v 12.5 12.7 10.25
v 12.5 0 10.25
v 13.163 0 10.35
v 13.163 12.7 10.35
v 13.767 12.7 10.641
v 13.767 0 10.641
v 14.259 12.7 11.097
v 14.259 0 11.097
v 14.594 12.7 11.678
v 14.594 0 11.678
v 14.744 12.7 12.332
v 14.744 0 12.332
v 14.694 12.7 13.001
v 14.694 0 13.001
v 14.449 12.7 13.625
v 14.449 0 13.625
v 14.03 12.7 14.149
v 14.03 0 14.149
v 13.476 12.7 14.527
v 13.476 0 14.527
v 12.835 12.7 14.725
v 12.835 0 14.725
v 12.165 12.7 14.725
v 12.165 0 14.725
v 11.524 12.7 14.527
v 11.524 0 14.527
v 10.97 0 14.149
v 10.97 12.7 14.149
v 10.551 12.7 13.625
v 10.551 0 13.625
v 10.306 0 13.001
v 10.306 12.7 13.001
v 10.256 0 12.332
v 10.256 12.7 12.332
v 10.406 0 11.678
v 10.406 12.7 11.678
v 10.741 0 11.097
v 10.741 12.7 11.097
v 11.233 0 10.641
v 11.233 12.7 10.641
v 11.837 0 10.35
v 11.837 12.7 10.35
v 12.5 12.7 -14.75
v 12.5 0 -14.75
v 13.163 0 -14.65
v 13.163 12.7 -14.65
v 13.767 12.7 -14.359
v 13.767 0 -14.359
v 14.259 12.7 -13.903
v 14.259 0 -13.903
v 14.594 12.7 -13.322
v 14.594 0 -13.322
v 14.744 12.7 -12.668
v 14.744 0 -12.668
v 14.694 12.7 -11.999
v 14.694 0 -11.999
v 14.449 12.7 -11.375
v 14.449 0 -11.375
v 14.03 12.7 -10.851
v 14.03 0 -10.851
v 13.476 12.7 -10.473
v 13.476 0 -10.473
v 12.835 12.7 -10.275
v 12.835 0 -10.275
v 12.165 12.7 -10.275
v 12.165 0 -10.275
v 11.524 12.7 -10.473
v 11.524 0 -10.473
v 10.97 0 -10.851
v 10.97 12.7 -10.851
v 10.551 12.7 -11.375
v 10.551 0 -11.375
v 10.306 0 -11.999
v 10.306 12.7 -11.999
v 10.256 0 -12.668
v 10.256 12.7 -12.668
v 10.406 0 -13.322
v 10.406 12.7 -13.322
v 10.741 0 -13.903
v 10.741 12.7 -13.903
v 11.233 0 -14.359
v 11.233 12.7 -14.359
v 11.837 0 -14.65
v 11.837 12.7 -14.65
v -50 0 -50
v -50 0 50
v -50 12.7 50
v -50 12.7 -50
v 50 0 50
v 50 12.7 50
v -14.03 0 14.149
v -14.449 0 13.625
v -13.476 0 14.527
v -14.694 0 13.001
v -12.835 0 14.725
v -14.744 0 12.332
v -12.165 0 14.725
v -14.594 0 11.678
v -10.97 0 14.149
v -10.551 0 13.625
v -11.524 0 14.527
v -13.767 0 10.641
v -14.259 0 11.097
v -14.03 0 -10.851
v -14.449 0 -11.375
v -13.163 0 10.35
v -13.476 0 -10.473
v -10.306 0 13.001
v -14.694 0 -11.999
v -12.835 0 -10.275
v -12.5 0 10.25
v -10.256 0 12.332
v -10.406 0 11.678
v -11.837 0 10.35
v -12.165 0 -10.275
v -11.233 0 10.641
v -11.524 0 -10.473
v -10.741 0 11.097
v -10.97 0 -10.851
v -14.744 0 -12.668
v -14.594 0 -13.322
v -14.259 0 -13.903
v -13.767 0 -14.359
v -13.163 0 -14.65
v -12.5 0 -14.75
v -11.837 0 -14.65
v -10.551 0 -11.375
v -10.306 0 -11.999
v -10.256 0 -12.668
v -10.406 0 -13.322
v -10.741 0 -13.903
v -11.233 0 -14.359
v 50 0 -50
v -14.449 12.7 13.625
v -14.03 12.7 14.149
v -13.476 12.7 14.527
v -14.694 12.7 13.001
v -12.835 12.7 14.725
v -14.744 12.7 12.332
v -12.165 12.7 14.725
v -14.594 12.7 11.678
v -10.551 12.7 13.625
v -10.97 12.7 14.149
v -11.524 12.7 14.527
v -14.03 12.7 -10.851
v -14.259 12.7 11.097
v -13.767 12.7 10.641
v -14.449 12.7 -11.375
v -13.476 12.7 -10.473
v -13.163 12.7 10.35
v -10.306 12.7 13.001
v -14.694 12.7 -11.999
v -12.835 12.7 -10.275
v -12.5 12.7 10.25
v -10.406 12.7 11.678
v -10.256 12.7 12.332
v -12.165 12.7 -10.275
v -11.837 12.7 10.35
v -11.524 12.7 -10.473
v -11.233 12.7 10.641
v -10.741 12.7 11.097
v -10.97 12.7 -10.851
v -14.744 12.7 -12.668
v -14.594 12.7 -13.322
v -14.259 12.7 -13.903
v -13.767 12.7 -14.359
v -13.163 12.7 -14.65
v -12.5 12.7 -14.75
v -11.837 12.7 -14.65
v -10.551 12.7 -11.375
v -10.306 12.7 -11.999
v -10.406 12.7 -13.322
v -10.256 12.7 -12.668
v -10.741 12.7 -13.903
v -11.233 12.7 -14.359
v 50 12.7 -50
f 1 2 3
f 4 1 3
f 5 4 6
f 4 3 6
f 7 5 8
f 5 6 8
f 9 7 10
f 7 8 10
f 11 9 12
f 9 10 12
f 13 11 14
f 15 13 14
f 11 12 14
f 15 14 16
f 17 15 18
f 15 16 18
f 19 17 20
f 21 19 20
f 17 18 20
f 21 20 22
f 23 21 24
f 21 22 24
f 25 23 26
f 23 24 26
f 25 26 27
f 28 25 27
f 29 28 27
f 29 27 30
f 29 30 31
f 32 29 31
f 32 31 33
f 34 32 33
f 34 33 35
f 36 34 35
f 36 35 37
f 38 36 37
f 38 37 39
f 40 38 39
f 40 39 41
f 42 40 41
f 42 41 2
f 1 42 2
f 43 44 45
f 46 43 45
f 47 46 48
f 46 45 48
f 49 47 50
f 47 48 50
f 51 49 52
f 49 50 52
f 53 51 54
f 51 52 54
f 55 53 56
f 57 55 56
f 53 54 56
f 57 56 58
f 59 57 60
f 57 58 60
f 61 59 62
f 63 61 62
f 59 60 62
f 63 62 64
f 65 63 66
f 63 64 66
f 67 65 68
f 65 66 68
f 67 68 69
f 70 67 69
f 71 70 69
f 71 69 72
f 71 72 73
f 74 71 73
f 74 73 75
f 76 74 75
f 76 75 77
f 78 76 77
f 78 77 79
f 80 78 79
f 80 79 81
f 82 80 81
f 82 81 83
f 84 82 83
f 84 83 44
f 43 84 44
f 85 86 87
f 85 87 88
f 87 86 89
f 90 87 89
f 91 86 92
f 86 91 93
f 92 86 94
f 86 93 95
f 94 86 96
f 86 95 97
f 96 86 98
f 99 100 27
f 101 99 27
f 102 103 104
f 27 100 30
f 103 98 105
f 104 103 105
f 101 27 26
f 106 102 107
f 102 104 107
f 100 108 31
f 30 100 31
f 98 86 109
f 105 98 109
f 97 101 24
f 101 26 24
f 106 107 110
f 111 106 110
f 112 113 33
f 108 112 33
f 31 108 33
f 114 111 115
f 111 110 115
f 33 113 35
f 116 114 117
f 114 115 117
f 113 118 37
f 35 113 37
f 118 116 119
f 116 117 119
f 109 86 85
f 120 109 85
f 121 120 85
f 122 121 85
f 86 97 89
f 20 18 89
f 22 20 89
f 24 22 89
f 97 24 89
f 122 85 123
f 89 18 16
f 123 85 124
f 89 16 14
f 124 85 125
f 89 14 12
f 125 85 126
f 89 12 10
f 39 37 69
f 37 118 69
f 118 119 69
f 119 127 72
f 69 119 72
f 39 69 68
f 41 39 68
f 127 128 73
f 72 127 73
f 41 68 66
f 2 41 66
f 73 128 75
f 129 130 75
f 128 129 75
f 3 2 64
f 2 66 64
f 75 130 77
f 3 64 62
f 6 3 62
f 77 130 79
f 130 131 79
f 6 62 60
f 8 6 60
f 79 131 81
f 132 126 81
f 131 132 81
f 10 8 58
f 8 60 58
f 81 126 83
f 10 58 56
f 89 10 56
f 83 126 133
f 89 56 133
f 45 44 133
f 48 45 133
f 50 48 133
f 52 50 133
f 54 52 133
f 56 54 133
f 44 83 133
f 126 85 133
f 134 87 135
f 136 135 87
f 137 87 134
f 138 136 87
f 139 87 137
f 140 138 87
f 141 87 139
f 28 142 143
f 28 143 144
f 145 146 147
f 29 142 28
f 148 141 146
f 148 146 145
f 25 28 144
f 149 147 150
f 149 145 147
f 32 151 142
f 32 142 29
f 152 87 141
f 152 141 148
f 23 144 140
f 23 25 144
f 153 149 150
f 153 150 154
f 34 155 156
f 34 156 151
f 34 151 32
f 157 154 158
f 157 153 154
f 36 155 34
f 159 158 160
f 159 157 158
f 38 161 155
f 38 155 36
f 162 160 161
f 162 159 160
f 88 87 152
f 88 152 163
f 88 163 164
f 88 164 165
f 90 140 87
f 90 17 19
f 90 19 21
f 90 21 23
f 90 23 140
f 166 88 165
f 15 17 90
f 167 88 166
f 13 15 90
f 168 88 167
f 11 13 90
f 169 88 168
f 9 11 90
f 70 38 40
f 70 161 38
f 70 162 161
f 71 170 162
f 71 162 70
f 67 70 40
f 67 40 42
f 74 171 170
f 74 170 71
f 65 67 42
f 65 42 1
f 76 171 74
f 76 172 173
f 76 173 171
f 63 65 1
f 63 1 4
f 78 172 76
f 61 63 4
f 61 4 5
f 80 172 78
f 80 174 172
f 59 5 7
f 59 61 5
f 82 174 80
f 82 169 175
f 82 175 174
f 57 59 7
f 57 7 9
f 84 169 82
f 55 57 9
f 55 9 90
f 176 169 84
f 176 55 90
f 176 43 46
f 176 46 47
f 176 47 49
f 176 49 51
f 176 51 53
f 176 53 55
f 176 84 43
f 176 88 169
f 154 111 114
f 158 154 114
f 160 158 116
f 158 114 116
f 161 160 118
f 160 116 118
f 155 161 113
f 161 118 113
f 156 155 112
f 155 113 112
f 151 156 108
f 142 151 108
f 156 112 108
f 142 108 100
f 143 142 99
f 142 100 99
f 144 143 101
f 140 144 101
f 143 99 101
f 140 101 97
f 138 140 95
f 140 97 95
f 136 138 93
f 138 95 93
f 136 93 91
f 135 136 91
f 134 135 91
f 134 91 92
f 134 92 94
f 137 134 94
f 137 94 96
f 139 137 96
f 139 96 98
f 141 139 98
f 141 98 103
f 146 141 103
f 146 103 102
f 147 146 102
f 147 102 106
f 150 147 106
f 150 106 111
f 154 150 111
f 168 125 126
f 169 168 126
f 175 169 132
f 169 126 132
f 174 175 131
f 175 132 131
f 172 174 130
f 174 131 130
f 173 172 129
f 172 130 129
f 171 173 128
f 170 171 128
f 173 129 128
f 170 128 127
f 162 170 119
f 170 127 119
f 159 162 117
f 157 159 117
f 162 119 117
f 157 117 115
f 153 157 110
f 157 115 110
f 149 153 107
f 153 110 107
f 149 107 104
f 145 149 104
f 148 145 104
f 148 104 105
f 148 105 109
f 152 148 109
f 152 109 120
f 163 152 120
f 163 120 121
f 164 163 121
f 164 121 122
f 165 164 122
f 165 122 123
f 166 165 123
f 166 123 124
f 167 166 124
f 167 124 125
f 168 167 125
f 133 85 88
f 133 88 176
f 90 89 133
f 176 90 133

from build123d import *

# Parameters (mm, degrees)
CROQUIS1_W              = 100
CROQUIS1_H              = 100
SALIENTE_EXTRUIR1_DEPTH = 12.7
CROQUIS3_OUTSIDE_W      = 130.398
CROQUIS3_OUTSIDE_H      = 130.398
CROQUIS3_OUTSIDE_W_2    = 100
CROQUIS3_OUTSIDE_H_2    = 100
CROQUIS3_OUTSIDE_R      = 2.25
CORTAR_EXTRUIR1_DEPTH   = 72.842118566


with BuildPart() as part:
    # Croquis1 → Saliente-Extruir1 (new body)
    with BuildSketch(Plane(origin=(0, 0, 0), x_dir=(1, 0, 0), z_dir=(0, 1, 0))):
        Rectangle(CROQUIS1_W, CROQUIS1_H)
    extrude(amount=SALIENTE_EXTRUIR1_DEPTH)

    # Croquis3 outside → Cortar-Extruir1 (cut, through all)
    # profile 1 of 5: a face of its own
    with BuildSketch(Plane.XZ):
        Rectangle(CROQUIS3_OUTSIDE_W, CROQUIS3_OUTSIDE_H)
        Rectangle(CROQUIS3_OUTSIDE_W_2, CROQUIS3_OUTSIDE_H_2, mode=Mode.SUBTRACT)
    # profile 2 of 5: a face of its own
    with BuildSketch(Plane.XZ):
        with Locations(Location((-12.5, -12.5, 0), (0, 0, 270))):
            Circle(CROQUIS3_OUTSIDE_R)
    # profile 3 of 5: a face of its own
    with BuildSketch(Plane.XZ):
        with Locations(Location((12.5, -12.5, 0), (0, 0, 270))):
            Circle(CROQUIS3_OUTSIDE_R)
    # profile 4 of 5: a face of its own
    with BuildSketch(Plane.XZ):
        with Locations(Location((-12.5, 12.5, 0), (0, 0, 270))):
            Circle(CROQUIS3_OUTSIDE_R)
    # profile 5 of 5: a face of its own
    with BuildSketch(Plane.XZ):
        with Locations(Location((12.5, 12.5, 0), (0, 0, 270))):
            Circle(CROQUIS3_OUTSIDE_R)
    extrude(amount=-CORTAR_EXTRUIR1_DEPTH, mode=Mode.SUBTRACT)


solid = part.part
